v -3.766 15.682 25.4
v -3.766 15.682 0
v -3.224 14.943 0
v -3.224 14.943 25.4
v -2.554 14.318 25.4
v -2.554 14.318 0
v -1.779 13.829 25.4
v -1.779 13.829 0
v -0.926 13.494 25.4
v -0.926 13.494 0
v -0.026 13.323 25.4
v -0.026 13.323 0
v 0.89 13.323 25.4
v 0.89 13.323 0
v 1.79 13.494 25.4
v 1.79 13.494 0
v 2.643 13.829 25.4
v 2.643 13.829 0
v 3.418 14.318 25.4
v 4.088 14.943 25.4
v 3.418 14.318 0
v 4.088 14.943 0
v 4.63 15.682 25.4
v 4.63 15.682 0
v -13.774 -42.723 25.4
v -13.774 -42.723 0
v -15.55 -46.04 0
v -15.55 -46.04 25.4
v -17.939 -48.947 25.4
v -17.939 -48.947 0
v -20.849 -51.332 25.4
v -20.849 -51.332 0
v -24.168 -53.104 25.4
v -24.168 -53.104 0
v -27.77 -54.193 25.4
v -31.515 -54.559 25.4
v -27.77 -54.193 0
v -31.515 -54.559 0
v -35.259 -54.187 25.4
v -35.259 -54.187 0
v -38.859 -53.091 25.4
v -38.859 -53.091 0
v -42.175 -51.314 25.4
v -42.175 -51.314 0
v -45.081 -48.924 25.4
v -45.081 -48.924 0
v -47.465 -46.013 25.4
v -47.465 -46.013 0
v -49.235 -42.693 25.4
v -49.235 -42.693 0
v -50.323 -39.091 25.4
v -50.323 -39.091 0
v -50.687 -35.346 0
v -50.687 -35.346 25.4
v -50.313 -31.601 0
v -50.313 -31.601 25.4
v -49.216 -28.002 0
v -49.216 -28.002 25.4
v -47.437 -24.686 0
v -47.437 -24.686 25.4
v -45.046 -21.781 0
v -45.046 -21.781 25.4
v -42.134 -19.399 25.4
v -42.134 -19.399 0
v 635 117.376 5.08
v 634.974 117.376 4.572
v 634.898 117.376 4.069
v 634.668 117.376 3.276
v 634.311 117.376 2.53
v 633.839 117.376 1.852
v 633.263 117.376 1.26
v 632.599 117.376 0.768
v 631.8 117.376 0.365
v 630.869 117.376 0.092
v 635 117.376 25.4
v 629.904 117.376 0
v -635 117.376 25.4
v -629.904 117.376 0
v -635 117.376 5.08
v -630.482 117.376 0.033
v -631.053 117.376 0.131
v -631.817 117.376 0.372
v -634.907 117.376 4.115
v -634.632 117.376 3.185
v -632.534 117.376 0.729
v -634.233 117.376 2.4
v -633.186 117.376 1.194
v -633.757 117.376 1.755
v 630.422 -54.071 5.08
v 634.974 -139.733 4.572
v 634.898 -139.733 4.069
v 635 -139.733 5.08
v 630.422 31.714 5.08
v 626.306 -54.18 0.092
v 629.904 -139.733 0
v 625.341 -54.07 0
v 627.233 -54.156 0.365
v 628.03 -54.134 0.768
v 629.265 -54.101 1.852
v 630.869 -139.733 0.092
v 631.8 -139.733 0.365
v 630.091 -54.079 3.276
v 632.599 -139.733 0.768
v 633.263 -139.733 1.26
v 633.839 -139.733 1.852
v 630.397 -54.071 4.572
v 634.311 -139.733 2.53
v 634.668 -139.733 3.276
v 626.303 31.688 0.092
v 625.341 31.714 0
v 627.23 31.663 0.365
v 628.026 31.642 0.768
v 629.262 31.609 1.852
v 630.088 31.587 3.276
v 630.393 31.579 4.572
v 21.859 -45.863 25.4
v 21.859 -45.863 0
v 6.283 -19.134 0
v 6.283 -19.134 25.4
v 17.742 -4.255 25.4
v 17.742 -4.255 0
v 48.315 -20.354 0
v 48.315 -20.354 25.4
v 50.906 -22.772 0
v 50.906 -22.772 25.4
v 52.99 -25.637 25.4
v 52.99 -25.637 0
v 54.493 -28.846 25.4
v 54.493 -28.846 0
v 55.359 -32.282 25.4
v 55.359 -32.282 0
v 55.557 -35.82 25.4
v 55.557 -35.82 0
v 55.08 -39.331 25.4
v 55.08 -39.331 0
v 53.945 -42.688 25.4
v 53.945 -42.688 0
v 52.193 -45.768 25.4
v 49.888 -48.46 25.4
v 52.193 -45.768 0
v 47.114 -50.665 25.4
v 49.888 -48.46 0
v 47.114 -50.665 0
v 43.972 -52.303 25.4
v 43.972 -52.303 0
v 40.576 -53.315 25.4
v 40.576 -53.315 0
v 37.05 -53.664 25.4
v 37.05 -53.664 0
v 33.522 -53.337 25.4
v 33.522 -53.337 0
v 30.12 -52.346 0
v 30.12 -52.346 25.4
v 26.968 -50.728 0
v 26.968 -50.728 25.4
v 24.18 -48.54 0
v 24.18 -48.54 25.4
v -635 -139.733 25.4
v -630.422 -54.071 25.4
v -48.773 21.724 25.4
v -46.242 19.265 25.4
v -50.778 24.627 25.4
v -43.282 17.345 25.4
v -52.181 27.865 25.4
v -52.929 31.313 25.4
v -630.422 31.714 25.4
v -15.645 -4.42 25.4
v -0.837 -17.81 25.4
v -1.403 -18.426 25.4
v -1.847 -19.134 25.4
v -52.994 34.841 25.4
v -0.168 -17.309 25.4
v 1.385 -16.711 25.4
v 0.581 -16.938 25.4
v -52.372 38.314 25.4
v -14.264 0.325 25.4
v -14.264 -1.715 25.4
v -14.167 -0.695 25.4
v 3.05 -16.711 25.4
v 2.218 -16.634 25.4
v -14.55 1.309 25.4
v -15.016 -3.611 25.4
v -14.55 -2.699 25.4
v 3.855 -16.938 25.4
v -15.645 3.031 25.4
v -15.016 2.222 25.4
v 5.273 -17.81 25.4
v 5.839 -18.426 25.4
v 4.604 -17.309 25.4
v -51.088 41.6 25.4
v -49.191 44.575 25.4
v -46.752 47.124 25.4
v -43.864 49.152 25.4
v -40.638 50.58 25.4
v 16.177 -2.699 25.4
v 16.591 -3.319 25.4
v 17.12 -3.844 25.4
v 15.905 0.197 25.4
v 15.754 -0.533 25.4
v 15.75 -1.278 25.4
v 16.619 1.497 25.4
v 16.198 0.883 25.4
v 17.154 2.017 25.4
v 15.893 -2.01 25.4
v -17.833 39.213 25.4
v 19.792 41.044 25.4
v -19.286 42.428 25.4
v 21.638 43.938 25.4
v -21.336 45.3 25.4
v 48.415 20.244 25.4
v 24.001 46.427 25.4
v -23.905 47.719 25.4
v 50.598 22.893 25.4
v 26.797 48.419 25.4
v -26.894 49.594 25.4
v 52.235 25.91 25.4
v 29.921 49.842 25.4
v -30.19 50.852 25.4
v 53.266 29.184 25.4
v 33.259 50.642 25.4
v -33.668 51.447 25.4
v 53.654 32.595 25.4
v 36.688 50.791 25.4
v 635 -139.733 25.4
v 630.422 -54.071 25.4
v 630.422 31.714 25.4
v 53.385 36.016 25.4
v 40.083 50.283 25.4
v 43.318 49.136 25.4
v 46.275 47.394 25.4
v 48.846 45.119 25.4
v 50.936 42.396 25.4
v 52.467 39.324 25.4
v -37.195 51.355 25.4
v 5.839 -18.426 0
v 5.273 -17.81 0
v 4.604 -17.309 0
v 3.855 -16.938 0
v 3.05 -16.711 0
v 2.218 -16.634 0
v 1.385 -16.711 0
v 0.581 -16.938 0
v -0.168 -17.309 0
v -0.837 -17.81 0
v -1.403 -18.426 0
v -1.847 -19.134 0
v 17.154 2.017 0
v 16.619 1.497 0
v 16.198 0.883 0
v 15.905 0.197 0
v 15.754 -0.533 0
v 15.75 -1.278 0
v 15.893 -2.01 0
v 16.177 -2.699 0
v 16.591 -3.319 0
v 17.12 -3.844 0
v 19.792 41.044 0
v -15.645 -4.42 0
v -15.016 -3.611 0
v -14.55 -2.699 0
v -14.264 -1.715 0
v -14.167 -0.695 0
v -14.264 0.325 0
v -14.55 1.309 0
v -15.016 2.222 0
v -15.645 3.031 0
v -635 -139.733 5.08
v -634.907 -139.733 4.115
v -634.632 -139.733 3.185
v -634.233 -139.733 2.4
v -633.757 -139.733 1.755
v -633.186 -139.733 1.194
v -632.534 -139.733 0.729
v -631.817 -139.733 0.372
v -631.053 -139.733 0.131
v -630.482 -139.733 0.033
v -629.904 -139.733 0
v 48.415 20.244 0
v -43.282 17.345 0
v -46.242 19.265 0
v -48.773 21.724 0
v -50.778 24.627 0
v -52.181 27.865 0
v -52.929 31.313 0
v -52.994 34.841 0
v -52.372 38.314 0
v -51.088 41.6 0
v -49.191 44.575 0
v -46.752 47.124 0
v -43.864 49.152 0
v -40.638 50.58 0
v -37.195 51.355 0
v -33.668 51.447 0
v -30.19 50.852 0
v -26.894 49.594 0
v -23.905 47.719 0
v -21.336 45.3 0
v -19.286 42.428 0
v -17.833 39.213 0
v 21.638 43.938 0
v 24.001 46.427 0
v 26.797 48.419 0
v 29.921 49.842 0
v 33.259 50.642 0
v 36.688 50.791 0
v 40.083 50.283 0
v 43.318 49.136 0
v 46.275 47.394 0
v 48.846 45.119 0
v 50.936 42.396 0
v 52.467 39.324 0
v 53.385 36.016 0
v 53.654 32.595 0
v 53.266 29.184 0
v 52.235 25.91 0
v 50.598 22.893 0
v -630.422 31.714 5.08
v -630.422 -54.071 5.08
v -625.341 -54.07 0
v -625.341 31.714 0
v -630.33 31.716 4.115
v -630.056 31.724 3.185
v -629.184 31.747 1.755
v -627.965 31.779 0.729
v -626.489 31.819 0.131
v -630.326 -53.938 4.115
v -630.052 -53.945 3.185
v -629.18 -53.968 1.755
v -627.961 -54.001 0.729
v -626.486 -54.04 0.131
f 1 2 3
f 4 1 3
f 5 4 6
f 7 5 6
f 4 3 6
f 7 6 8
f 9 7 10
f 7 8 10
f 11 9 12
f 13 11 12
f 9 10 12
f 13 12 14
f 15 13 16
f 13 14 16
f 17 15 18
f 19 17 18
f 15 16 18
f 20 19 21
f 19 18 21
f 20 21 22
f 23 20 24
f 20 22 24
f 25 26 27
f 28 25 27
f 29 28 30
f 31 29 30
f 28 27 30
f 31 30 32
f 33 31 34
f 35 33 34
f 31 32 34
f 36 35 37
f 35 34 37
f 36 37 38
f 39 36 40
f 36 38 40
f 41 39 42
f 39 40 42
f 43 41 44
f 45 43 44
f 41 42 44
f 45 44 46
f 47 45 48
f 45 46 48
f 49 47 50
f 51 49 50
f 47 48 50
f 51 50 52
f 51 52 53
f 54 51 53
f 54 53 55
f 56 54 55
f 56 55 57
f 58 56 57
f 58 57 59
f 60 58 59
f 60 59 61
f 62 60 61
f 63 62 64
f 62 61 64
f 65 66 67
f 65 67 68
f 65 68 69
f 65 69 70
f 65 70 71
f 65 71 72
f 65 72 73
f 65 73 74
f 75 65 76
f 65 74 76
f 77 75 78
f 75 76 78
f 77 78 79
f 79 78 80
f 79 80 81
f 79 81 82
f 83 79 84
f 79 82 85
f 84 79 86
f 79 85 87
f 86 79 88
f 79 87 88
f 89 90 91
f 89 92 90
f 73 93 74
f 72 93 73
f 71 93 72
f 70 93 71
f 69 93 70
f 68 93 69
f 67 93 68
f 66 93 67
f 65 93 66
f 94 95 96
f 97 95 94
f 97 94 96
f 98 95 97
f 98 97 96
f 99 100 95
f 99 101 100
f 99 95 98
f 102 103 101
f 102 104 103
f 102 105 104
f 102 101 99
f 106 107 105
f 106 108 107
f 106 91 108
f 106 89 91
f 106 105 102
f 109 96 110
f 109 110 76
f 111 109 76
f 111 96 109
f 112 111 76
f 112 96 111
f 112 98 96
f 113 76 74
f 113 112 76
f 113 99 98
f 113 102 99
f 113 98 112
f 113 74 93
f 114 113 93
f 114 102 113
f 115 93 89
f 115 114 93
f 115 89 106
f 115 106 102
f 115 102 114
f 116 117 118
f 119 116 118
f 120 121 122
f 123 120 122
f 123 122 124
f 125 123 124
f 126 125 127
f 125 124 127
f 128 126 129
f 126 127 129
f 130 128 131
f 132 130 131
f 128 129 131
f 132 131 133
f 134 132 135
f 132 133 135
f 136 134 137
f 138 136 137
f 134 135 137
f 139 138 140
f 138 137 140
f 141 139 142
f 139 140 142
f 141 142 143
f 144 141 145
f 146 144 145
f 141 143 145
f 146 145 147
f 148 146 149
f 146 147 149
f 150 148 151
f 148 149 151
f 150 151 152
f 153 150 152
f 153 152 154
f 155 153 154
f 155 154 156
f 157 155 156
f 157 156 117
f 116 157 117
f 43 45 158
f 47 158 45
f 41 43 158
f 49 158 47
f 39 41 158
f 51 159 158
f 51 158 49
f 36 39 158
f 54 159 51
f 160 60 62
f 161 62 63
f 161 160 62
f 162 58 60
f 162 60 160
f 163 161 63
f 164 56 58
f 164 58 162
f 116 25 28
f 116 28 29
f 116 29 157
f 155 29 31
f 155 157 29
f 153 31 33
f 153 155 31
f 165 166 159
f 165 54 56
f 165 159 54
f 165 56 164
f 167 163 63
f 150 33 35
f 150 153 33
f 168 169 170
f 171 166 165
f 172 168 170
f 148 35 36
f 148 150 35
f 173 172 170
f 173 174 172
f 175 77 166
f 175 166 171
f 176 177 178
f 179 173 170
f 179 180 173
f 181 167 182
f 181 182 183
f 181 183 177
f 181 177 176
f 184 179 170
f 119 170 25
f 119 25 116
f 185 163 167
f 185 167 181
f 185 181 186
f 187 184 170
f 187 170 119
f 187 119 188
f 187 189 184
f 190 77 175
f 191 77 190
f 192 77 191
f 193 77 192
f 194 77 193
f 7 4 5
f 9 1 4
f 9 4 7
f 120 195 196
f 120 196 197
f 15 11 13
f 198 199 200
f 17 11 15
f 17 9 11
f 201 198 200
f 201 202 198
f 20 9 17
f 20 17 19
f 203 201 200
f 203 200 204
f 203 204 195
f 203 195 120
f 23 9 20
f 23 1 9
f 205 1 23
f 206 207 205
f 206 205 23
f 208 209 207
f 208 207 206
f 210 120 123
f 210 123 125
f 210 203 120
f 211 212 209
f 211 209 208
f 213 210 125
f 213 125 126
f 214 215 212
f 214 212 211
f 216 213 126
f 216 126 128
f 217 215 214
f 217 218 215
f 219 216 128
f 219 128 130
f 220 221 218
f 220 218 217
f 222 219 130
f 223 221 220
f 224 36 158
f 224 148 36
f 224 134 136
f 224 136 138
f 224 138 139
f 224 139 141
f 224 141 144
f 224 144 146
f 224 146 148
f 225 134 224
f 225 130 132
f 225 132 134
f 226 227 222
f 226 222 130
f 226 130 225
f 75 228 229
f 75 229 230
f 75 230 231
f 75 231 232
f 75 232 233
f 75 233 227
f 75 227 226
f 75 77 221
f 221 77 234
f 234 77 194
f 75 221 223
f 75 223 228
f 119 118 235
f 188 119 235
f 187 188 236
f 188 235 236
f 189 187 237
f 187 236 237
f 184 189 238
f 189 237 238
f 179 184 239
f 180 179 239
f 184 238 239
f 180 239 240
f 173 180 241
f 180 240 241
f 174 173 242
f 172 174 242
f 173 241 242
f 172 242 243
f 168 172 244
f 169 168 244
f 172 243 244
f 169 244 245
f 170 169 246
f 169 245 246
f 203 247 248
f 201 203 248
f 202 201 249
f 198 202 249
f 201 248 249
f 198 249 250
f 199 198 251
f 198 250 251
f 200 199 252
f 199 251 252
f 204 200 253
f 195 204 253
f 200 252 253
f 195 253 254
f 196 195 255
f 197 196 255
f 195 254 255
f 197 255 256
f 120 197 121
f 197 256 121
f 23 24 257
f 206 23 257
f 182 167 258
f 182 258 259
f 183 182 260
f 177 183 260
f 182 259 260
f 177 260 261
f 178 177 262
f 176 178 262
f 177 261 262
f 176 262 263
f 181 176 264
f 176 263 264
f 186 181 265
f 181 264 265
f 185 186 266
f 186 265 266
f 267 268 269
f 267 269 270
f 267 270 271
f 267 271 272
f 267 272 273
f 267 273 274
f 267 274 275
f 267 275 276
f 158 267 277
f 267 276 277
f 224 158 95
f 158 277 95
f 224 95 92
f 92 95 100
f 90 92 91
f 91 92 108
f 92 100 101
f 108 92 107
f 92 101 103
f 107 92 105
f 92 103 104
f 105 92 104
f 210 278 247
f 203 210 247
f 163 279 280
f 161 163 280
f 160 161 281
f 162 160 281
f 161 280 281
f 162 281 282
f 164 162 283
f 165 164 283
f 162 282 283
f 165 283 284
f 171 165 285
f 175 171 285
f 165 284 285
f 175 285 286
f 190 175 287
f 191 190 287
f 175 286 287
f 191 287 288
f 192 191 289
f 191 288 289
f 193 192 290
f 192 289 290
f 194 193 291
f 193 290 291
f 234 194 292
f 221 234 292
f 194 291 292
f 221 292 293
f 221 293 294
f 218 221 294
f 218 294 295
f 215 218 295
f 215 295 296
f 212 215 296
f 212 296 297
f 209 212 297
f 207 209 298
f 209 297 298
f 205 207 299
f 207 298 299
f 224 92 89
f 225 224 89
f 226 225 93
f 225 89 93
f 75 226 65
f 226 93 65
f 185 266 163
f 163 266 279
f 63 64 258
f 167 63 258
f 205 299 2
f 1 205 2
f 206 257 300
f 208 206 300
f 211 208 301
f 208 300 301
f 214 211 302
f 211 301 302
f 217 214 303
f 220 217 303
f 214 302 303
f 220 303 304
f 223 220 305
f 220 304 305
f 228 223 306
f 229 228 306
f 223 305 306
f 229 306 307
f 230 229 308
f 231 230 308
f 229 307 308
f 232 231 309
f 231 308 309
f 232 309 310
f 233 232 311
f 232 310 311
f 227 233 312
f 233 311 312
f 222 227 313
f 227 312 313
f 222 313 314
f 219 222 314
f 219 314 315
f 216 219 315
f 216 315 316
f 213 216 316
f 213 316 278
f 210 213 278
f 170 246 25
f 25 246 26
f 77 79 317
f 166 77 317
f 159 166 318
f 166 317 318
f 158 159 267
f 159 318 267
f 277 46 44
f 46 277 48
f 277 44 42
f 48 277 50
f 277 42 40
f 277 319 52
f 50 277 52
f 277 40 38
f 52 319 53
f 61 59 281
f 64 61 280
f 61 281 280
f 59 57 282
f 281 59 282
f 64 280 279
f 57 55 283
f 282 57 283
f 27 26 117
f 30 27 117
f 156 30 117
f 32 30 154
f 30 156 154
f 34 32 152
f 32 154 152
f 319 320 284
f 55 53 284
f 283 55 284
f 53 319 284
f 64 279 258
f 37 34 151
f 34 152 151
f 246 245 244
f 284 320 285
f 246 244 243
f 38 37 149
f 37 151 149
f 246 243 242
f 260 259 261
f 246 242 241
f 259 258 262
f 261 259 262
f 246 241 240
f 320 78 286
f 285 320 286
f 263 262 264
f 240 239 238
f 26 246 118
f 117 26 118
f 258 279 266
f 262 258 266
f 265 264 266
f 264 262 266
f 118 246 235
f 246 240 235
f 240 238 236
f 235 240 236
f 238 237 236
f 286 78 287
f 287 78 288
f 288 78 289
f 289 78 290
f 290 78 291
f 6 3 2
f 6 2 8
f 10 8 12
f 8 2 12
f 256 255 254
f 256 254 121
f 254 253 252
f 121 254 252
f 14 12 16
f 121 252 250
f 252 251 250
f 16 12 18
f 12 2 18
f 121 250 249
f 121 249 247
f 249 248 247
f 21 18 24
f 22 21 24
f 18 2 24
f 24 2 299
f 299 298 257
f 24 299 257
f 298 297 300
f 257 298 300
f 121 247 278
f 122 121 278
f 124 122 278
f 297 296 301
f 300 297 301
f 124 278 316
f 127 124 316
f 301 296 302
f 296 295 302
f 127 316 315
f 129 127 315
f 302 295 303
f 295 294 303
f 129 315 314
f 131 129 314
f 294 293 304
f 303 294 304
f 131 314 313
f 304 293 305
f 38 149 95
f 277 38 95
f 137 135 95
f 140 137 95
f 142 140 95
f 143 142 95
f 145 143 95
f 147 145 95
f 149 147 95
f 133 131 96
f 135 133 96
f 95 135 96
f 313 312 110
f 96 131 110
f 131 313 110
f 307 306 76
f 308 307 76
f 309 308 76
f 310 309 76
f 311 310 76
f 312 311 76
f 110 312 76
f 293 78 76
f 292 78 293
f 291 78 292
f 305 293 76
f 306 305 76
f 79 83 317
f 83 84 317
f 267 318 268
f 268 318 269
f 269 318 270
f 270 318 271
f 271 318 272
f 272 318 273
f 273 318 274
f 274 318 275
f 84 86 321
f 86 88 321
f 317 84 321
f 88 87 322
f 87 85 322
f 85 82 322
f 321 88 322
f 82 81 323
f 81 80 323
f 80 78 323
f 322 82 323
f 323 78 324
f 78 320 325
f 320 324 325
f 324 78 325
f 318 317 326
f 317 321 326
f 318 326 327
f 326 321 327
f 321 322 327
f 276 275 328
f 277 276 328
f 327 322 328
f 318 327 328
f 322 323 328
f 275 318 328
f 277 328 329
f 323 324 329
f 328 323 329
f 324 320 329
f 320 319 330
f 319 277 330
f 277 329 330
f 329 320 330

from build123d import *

# Parameters (mm, degrees)
F1_DEPTH = 25.4
F2_R     = 5.08
F3_R     = 5.08


with BuildPart() as f1:
    # F0 (on Top) → F1 (new body)
    with BuildSketch(Plane.XY):
        with BuildLine():
            ThreePointArc((-635, 117.375871), (-629.849929, -11.178382), (-635, -139.732635))
            Line((-635, -139.732635), (0, -139.732635))
            Line((0, -139.732635), (635, -139.732635))
            ThreePointArc((635, -139.732635), (629.849929, -11.178382), (635, 117.375871))
            Line((635, 117.375871), (0, 117.375871))
            Line((0, 117.375871), (-635, 117.375871))
        make_face()
        with BuildLine():
            ThreePointArc((-43.281963, 17.344755), (-46.751505, 47.124444), (-17.833089, 39.212882))
            Line((-17.833089, 39.212882), (-3.765872, 15.682267))
            ThreePointArc((-3.765872, 15.682267), (0.431929, 13.301076), (4.62973, 15.682267))
            Line((4.62973, 15.682267), (19.791877, 41.044401))
            ThreePointArc((19.791877, 41.044401), (46.275397, 47.39389), (48.414995, 20.24403))
            Line((48.414995, 20.24403), (17.154038, 2.016637))
            ThreePointArc((17.154038, 2.016637), (15.749838, -1.278464), (17.74202, -4.255153))
            Line((17.74202, -4.255153), (48.315184, -20.3542))
            ThreePointArc((48.315184, -20.3542), (49.888098, -48.459777), (21.858588, -45.862841))
            Line((21.858588, -45.862841), (6.283131, -19.133924))
            ThreePointArc((6.283131, -19.133924), (2.217899, -16.634052), (-1.847334, -19.133924))
            Line((-1.847334, -19.133924), (-13.774237, -42.722683))
            ThreePointArc((-13.774237, -42.722683), (-43.686922, -50.190632), (-42.133754, -19.398967))
            Line((-42.133754, -19.398967), (-15.645329, -4.420306))
            ThreePointArc((-15.645329, -4.420306), (-14.166998, -0.694867), (-15.645329, 3.030572))
            Line((-15.645329, 3.030572), (-43.281963, 17.344755))
        make_face(mode=Mode.SUBTRACT)
    extrude(amount=F1_DEPTH)

    # F2
    f2_edges = [f1.edges().sort_by_distance(p)[0] for p in [
        (-629.849929, -11.178382, 0),
    ]]
    fillet(f2_edges, radius=F2_R)

    # F3
    f3_edges = [f1.edges().sort_by_distance(p)[0] for p in [
        (629.849929, -11.178382, 0),
    ]]
    fillet(f3_edges, radius=F3_R)


solid = f1.part
